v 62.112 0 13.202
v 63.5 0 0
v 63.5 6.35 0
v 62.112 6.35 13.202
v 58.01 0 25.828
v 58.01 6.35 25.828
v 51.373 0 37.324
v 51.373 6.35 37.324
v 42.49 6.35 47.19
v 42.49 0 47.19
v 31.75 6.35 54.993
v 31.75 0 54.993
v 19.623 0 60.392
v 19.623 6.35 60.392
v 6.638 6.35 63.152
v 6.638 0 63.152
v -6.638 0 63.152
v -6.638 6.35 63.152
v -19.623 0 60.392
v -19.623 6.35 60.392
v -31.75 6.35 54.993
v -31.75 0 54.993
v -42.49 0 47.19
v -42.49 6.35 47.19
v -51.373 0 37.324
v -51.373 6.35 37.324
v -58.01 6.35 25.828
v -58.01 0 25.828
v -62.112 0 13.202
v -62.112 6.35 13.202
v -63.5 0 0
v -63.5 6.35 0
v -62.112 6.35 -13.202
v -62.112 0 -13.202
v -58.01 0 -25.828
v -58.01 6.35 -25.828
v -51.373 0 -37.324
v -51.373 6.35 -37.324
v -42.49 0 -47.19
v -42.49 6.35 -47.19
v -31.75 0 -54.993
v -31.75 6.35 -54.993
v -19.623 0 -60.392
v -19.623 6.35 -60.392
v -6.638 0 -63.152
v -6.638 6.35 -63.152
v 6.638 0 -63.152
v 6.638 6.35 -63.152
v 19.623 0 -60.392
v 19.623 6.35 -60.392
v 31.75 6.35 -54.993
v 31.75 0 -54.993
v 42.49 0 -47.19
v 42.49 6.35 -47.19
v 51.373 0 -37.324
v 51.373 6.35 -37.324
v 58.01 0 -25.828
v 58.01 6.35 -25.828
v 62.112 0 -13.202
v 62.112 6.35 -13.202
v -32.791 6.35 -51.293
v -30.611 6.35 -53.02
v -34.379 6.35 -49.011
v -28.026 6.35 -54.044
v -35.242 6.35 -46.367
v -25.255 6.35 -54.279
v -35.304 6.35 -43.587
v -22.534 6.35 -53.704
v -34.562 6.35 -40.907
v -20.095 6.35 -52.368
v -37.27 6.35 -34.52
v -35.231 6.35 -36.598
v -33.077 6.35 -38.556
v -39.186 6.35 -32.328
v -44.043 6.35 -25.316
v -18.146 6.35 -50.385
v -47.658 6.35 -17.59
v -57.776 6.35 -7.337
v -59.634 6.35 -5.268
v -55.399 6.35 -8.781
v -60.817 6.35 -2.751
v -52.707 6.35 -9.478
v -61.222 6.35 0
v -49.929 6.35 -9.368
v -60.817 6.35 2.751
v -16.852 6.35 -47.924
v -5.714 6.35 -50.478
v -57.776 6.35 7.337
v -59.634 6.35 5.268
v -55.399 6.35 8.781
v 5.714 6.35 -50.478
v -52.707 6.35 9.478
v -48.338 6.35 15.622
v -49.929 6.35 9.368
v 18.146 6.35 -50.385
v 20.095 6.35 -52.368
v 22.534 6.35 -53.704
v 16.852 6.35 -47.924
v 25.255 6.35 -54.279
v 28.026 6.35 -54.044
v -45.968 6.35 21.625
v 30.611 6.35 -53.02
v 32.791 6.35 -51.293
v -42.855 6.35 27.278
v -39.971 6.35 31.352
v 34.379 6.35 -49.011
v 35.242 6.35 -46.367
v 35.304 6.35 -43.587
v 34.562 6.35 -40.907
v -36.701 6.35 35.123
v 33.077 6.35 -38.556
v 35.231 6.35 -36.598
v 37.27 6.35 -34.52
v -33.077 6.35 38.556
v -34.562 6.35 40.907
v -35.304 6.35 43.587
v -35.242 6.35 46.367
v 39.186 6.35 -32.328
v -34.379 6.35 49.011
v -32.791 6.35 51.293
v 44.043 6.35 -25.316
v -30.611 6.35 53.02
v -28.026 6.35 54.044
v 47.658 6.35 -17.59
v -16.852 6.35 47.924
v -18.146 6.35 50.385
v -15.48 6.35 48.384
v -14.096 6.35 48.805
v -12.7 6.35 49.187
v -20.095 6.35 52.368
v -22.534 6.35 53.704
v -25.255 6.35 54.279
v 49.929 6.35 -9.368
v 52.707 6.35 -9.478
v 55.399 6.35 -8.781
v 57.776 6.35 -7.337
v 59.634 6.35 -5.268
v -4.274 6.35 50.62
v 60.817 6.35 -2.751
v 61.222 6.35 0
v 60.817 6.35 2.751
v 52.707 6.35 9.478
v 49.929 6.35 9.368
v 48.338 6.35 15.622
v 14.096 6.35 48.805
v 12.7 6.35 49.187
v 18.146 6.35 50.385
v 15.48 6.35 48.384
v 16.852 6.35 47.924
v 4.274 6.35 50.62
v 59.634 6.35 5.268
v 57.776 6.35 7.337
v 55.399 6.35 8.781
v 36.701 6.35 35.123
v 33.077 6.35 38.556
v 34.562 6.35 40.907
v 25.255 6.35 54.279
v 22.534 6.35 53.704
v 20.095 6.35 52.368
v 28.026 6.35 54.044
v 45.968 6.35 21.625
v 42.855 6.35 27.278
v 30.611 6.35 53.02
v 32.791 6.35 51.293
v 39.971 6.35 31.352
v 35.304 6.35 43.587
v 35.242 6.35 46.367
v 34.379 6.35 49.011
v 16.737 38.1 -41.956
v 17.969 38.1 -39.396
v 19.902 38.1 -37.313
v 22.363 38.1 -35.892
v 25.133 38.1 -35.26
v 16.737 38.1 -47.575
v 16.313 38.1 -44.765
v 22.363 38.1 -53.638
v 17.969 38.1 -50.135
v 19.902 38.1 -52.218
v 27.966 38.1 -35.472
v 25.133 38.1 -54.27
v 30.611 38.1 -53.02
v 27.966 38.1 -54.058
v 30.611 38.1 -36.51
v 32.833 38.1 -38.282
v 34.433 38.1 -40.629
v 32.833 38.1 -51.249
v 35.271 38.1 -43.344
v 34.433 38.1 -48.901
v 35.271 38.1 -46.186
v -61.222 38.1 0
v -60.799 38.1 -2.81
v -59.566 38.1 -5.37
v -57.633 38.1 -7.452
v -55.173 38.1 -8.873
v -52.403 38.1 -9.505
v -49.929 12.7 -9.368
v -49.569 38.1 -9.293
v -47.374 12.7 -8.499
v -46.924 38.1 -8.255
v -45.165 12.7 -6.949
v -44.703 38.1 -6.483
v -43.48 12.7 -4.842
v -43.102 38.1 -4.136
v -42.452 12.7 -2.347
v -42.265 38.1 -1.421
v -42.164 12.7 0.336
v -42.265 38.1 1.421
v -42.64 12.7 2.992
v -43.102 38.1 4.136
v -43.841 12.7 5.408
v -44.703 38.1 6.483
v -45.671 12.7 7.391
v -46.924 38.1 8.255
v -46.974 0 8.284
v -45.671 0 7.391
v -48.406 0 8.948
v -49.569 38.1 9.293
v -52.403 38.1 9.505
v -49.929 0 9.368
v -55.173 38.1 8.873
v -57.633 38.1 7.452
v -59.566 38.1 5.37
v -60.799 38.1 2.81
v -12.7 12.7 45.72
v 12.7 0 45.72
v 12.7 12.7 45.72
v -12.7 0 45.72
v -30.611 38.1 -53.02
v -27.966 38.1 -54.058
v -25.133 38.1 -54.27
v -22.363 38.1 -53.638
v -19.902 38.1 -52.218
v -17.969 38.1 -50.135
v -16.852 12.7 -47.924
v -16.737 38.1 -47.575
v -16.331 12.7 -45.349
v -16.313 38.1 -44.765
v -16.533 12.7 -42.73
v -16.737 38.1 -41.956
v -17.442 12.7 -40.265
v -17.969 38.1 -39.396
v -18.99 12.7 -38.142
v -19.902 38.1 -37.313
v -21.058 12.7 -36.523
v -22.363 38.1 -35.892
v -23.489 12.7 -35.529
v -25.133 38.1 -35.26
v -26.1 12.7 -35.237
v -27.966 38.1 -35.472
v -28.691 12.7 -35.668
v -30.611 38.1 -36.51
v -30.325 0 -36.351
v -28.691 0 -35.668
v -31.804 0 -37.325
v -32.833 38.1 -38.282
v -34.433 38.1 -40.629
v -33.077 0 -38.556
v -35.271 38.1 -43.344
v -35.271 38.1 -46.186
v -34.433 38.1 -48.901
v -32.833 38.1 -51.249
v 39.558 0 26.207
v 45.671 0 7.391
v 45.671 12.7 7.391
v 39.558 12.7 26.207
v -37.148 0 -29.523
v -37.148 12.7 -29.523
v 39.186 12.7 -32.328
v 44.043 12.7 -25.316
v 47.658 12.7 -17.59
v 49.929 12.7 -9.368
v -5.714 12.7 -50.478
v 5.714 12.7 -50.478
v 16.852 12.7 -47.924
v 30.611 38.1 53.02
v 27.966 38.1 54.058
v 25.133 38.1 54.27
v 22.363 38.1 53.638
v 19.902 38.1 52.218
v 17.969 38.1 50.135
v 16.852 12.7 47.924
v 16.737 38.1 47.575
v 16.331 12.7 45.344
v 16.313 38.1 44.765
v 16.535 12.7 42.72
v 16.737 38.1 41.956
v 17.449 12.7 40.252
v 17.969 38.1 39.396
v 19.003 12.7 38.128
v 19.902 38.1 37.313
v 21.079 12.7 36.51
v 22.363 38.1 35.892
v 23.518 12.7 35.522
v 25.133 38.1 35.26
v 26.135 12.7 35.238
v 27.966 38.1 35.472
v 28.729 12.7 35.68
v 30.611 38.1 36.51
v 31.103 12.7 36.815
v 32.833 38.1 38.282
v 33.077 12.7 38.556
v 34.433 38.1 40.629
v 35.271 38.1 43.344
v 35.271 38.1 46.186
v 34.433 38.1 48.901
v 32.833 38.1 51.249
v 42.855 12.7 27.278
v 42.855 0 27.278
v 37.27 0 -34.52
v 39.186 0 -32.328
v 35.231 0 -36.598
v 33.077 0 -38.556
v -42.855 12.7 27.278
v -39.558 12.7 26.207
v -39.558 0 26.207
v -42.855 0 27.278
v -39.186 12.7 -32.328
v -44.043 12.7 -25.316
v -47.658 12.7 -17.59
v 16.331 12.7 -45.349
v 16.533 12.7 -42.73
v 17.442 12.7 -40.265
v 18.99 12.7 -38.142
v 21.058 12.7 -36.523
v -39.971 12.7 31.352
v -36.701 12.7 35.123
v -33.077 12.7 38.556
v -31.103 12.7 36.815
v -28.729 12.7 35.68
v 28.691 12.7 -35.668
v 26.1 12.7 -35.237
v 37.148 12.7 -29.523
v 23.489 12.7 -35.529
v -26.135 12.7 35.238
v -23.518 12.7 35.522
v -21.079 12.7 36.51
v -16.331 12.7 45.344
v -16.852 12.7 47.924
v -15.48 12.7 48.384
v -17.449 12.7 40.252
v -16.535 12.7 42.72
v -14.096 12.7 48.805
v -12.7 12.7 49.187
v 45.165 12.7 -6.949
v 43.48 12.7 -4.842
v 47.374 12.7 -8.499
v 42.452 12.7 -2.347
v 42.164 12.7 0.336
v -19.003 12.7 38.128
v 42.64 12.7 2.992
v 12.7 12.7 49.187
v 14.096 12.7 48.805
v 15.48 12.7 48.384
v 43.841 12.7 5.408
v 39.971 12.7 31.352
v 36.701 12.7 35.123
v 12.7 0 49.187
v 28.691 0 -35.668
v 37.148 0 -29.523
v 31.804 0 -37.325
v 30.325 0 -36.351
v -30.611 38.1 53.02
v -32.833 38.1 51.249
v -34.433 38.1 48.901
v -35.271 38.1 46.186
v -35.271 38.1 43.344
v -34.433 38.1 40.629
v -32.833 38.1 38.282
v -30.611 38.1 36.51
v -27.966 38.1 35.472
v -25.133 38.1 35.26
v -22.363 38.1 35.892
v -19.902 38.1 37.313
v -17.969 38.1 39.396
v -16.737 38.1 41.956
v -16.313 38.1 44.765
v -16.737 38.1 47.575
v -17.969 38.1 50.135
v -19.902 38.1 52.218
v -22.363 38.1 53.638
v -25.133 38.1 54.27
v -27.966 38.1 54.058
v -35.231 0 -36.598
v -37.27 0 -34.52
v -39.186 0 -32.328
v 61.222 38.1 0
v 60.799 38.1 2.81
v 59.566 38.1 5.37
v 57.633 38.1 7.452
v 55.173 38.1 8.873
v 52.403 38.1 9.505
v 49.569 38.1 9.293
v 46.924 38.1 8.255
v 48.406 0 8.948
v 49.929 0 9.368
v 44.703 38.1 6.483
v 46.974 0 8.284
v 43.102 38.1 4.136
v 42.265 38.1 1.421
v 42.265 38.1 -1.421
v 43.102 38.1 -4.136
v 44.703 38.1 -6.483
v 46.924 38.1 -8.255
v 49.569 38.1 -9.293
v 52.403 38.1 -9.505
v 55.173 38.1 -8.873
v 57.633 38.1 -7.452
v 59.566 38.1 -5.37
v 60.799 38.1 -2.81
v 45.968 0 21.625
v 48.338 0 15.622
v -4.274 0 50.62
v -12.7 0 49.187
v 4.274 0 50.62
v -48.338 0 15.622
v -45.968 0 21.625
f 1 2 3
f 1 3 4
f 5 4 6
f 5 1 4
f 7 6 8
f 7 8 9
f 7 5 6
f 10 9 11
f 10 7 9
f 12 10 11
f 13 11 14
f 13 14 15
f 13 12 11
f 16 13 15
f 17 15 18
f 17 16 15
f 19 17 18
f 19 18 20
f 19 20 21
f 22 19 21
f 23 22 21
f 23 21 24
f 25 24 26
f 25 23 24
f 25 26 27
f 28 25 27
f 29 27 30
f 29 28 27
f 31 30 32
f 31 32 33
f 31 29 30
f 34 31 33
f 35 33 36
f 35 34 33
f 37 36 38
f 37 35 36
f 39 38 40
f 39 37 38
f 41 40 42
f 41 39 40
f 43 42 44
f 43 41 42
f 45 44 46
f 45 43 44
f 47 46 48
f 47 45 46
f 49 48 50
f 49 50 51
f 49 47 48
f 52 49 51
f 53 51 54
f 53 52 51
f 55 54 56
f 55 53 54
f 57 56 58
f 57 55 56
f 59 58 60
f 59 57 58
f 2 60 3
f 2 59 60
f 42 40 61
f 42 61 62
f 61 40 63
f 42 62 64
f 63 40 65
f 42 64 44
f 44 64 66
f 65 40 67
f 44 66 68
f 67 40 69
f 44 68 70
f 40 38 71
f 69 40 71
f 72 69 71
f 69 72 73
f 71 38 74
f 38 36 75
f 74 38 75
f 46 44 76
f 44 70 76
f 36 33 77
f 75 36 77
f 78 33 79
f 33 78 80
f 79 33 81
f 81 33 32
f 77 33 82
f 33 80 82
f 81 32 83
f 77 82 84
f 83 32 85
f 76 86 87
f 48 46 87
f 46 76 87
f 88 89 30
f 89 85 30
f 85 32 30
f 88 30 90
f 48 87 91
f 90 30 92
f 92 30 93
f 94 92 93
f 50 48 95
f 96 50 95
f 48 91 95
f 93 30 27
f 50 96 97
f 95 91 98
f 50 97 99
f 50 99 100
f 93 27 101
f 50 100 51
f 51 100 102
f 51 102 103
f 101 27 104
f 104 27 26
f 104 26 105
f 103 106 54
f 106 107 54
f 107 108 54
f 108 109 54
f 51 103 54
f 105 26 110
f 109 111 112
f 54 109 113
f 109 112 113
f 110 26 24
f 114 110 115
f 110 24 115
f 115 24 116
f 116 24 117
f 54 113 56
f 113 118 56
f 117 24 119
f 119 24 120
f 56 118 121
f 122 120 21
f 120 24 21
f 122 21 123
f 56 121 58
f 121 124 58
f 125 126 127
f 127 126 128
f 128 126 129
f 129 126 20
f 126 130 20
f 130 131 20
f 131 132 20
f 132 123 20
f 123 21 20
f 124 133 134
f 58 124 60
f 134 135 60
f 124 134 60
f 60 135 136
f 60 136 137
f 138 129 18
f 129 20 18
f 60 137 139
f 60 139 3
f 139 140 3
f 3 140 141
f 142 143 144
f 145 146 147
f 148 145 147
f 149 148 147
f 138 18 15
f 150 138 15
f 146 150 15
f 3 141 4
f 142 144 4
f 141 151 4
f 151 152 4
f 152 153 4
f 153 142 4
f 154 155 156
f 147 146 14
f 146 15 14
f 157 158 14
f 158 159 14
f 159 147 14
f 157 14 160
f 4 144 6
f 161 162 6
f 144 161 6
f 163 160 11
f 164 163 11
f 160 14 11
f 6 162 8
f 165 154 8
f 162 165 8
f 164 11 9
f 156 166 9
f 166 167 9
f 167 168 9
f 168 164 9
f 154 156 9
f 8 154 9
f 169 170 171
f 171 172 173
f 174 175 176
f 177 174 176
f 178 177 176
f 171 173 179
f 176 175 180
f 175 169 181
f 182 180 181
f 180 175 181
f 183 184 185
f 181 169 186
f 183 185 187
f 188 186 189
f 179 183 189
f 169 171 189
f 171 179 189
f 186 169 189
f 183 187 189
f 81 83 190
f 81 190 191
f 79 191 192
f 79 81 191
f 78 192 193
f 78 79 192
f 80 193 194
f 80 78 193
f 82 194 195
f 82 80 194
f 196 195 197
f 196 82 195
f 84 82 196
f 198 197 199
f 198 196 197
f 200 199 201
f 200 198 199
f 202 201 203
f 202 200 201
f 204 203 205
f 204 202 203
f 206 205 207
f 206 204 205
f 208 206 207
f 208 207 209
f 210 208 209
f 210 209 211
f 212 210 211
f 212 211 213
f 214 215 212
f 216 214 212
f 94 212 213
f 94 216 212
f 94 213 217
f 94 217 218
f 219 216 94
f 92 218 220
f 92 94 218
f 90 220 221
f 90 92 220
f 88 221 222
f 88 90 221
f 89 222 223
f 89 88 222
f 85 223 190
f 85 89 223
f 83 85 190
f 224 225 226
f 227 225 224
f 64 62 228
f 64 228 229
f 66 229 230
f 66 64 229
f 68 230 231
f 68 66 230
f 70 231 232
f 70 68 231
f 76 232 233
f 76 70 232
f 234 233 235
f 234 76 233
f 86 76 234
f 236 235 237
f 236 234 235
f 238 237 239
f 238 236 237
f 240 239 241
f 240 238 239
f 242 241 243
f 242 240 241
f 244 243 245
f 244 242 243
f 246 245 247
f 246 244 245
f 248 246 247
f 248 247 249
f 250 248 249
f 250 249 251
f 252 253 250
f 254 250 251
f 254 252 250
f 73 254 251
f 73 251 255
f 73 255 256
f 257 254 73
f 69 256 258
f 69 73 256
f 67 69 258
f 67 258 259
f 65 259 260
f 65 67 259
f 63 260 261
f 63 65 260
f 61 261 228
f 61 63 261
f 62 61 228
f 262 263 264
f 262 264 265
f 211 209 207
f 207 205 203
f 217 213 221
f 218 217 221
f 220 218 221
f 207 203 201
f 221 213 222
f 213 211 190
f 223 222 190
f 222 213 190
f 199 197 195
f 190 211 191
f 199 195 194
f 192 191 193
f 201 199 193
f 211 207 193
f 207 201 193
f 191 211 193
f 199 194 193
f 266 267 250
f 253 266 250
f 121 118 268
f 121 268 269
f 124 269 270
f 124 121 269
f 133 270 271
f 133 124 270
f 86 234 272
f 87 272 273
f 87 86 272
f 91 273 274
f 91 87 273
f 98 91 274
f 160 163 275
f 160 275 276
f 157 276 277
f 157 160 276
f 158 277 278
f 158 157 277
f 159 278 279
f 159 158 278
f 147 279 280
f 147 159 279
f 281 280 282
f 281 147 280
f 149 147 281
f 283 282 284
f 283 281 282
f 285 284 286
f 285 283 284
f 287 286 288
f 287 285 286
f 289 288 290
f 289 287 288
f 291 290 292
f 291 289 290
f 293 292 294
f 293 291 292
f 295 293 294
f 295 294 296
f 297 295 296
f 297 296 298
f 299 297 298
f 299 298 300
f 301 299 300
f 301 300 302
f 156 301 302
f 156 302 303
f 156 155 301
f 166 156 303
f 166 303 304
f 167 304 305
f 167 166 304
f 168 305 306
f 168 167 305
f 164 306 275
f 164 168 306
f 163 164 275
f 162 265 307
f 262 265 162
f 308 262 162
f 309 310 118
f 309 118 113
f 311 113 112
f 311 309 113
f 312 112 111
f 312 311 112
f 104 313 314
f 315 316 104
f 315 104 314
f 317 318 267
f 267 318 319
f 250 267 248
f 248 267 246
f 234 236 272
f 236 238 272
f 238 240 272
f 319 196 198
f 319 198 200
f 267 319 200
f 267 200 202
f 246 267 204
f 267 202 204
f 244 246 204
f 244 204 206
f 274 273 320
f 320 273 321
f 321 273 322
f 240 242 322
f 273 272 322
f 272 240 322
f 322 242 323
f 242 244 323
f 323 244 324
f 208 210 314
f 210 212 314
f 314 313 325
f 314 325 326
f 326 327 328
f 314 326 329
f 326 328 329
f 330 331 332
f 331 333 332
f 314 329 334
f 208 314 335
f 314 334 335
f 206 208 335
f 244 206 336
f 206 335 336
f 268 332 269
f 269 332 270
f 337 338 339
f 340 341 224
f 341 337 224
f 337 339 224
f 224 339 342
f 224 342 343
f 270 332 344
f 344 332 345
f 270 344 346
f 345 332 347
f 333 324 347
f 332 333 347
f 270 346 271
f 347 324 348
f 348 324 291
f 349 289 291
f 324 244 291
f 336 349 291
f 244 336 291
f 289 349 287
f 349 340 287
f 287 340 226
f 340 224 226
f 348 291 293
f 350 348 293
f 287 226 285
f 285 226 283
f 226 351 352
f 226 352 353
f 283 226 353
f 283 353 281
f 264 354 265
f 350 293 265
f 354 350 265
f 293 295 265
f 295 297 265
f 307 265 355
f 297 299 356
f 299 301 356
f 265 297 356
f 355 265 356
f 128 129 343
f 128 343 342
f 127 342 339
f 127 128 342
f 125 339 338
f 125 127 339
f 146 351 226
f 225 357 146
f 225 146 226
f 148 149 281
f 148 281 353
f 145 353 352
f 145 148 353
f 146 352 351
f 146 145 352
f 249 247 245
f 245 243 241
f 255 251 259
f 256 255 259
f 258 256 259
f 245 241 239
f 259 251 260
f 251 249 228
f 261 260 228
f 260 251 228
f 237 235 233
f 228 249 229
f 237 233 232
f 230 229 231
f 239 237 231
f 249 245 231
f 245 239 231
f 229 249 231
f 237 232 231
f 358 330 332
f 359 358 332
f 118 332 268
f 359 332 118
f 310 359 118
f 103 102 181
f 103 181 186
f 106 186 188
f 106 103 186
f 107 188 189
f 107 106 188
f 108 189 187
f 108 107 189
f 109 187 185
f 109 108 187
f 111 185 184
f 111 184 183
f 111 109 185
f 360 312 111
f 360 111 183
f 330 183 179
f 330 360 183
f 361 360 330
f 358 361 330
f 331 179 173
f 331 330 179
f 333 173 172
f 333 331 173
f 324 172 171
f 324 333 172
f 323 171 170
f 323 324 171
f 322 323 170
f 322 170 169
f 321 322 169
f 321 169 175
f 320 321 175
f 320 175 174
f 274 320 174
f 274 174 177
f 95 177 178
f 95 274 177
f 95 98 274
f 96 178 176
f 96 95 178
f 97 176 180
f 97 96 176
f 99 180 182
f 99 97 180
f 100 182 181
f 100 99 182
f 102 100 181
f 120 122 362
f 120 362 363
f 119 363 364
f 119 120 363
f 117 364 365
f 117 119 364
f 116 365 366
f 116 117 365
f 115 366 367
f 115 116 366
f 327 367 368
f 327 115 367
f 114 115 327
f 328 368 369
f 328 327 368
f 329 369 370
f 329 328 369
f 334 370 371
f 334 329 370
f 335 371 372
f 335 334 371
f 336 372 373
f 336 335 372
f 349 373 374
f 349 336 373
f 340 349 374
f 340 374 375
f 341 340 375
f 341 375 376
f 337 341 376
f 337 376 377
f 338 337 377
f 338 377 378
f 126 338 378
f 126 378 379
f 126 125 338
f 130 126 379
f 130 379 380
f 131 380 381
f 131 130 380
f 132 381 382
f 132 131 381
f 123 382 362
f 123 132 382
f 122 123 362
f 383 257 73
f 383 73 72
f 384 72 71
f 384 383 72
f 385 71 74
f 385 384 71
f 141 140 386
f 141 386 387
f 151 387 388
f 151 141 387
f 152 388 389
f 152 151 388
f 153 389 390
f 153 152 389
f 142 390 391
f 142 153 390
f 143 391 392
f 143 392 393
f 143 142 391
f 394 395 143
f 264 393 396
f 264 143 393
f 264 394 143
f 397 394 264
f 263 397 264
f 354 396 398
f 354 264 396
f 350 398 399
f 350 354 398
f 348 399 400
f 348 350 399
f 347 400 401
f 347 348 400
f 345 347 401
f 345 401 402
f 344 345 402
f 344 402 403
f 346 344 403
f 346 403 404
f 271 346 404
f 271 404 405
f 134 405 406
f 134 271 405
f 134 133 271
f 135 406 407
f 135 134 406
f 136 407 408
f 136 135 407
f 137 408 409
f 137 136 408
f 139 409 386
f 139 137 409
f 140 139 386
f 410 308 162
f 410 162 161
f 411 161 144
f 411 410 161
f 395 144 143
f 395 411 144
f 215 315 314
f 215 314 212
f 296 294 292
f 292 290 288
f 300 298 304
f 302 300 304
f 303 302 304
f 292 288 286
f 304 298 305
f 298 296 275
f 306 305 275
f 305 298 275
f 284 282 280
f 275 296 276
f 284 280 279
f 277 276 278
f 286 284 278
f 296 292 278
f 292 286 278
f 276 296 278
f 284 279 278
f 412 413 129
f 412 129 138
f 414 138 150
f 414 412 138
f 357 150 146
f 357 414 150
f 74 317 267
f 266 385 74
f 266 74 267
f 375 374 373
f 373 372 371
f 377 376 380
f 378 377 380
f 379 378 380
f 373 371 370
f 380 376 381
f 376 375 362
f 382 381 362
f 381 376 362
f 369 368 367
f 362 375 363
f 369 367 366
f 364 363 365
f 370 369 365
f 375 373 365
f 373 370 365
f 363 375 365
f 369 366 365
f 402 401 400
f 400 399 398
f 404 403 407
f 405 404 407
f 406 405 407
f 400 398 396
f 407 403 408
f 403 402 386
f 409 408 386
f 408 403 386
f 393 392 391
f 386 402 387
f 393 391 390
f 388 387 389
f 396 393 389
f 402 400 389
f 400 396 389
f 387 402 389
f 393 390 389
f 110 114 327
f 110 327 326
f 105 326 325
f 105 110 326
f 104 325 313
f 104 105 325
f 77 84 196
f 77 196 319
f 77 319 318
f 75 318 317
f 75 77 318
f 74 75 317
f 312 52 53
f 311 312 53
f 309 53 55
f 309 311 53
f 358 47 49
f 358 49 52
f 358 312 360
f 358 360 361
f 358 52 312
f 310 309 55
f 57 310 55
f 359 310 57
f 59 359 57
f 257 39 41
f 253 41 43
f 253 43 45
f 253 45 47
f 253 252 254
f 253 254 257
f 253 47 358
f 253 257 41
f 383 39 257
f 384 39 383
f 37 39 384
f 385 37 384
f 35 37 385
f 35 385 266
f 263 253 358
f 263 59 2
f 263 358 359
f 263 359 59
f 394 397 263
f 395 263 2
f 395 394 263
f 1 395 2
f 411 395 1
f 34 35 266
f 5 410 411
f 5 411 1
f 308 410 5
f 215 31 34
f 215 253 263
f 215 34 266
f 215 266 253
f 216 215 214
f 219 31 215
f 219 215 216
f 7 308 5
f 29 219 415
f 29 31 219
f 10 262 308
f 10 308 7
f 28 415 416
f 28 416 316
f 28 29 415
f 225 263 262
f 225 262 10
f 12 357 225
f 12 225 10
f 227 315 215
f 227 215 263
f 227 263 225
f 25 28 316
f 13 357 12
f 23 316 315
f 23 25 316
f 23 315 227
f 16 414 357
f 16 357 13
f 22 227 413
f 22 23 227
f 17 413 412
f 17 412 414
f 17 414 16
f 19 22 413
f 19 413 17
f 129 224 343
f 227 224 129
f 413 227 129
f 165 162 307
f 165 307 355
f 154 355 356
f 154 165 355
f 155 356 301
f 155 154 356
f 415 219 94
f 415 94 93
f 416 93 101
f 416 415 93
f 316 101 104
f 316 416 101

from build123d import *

# Parameters (mm, degrees)
F0_R            = 63.5
F1_DEPTH        = 6.35
F2_DEPTH        = 12.7
F3_R            = 9.5319869965
F4_DEPTH        = 38.1
F4_COPIES_COUNT = 6


# Not quite as in the source:
# - a pattern or mirror of a feature is missing from the dataset's text; its kind, count and spacing are read off the source's solid


with BuildPart() as f1:
    # F0 (on Front) → F1 (new body)
    with BuildSketch(Plane.XZ):
        Circle(F0_R)
        with BuildLine():
            ThreePointArc((50.7040266498, 3.121166689), (50.7760009936, 1.5613209459), (50.8, 0))
            ThreePointArc((50.8, 0), (47.8083719104, -17.1755516731), (39.1858434932, -32.3281559902))
            Line((39.1858434932, -32.3281559902), (40.8804939154, -34.660642193))
            Line((40.8804939154, -34.660642193), (20.3314622583, -49.5903876012))
            Line((20.3314622583, -49.5903876012), (18.636811836, -47.2579013985))
            ThreePointArc((18.636811836, -47.2579013985), (0, -50.8), (-18.636811836, -47.2579013985))
            Line((-18.636811836, -47.2579013985), (-20.3314622583, -49.5903876012))
            Line((-20.3314622583, -49.5903876012), (-40.8804939154, -34.660642193))
            Line((-40.8804939154, -34.660642193), (-39.1858434932, -32.3281559902))
            ThreePointArc((-39.1858434932, -32.3281559902), (-48.3136710278, -15.6980633142), (-50.7040266498, 3.121166689))
            Line((-50.7040266498, 3.121166689), (-53.4460286321, 4.0120971402))
            Line((-53.4460286321, 4.0120971402), (-45.5969969749, 28.1689326541))
            Line((-45.5969969749, 28.1689326541), (-42.8549949926, 27.2780022029))
            ThreePointArc((-42.8549949926, 27.2780022029), (-29.8594908165, 41.0980633142), (-12.7, 49.1868884968))
            Line((-12.7, 49.1868884968), (-12.7, 52.07))
            Line((-12.7, 52.07), (12.7, 52.07))
            Line((12.7, 52.07), (12.7, 49.1868884968))
            ThreePointArc((12.7, 49.1868884968), (29.8594908165, 41.0980633142), (42.8549949926, 27.2780022029))
            Line((42.8549949926, 27.2780022029), (45.5969969749, 28.1689326541))
            Line((45.5969969749, 28.1689326541), (53.4460286321, 4.0120971402))
            Line((53.4460286321, 4.0120971402), (50.7040266498, 3.121166689))
        make_face(mode=Mode.SUBTRACT)
        with BuildLine():
            Line((-20.3314622583, -49.5903876012), (-18.636811836, -47.2579013985))
            ThreePointArc((-18.636811836, -47.2579013985), (-29.8594908165, -41.0980633142), (-39.1858434932, -32.3281559902))
            Line((-39.1858434932, -32.3281559902), (-40.8804939154, -34.660642193))
            Line((-40.8804939154, -34.660642193), (-20.3314622583, -49.5903876012))
        make_face()
        with BuildLine():
            ThreePointArc((-50.7040266498, 3.121166689), (-48.3136710278, 15.6980633142), (-42.8549949926, 27.2780022029))
            Line((-42.8549949926, 27.2780022029), (-45.5969969749, 28.1689326541))
            Line((-45.5969969749, 28.1689326541), (-53.4460286321, 4.0120971402))
            Line((-53.4460286321, 4.0120971402), (-50.7040266498, 3.121166689))
        make_face()
        with BuildLine():
            Line((40.8804939154, -34.660642193), (39.1858434932, -32.3281559902))
            ThreePointArc((39.1858434932, -32.3281559902), (29.8594908165, -41.0980633142), (18.636811836, -47.2579013985))
            Line((18.636811836, -47.2579013985), (20.3314622583, -49.5903876012))
            Line((20.3314622583, -49.5903876012), (40.8804939154, -34.660642193))
        make_face()
        with BuildLine():
            ThreePointArc((42.8549949926, 27.2780022029), (48.3136710278, 15.6980633142), (50.7040266498, 3.121166689))
            Line((50.7040266498, 3.121166689), (53.4460286321, 4.0120971402))
            Line((53.4460286321, 4.0120971402), (45.5969969749, 28.1689326541))
            Line((45.5969969749, 28.1689326541), (42.8549949926, 27.2780022029))
        make_face()
        with BuildLine():
            ThreePointArc((-12.7, 49.1868884968), (0, 50.8), (12.7, 49.1868884968))
            Line((12.7, 49.1868884968), (12.7, 52.07))
            Line((12.7, 52.07), (-12.7, 52.07))
            Line((-12.7, 52.07), (-12.7, 49.1868884968))
        make_face()
    extrude(amount=-F1_DEPTH)

    # F0 (on Front) → F2 (join)
    with BuildSketch(Plane.XZ):
        with BuildLine():
            ThreePointArc((39.1858434932, -32.3281559902), (47.8083719104, -17.1755516731), (50.8, 0))
            ThreePointArc((50.8, 0), (50.7760009936, 1.5613209459), (50.7040266498, 3.121166689))
            Line((50.7040266498, 3.121166689), (47.4068197536, 2.0498392259))
            Line((47.4068197536, 2.0498392259), (39.5577880965, 26.2066747398))
            Line((39.5577880965, 26.2066747398), (42.8549949926, 27.2780022029))
            ThreePointArc((42.8549949926, 27.2780022029), (29.8594908165, 41.0980633142), (12.7, 49.1868884968))
            Line((12.7, 49.1868884968), (12.7, 45.72))
            Line((12.7, 45.72), (-12.7, 45.72))
            Line((-12.7, 45.72), (-12.7, 49.1868884968))
            ThreePointArc((-12.7, 49.1868884968), (-29.8594908165, 41.0980633142), (-42.8549949926, 27.2780022029))
            Line((-42.8549949926, 27.2780022029), (-39.5577880965, 26.2066747398))
            Line((-39.5577880965, 26.2066747398), (-47.4068197536, 2.0498392259))
            Line((-47.4068197536, 2.0498392259), (-50.7040266498, 3.121166689))
            ThreePointArc((-50.7040266498, 3.121166689), (-48.3136710278, -15.6980633142), (-39.1858434932, -32.3281559902))
            Line((-39.1858434932, -32.3281559902), (-37.1480575634, -29.5233842787))
            Line((-37.1480575634, -29.5233842787), (-16.5990259063, -44.4531296869))
            Line((-16.5990259063, -44.4531296869), (-18.636811836, -47.2579013985))
            ThreePointArc((-18.636811836, -47.2579013985), (0, -50.8), (18.636811836, -47.2579013985))
            Line((18.636811836, -47.2579013985), (16.5990259063, -44.4531296869))
            Line((16.5990259063, -44.4531296869), (37.1480575634, -29.5233842787))
            Line((37.1480575634, -29.5233842787), (39.1858434932, -32.3281559902))
        make_face()
    extrude(amount=-F2_DEPTH)

    # F3 (on Front) → F4 (join)
    with BuildSketch(Plane.XZ):
        with Locations((51.6903102398, 0)):
            Circle(F3_R)
    f4 = extrude(amount=-F4_DEPTH)

    # F4_copies: F4 ×6 about axis
    f4_copies_axis = Axis((0, 0, 0), (0, 1, 0))
    for i in range(1, F4_COPIES_COUNT):
        add(f4.rotate(f4_copies_axis, i * 360 / F4_COPIES_COUNT))


solid = f1.part
